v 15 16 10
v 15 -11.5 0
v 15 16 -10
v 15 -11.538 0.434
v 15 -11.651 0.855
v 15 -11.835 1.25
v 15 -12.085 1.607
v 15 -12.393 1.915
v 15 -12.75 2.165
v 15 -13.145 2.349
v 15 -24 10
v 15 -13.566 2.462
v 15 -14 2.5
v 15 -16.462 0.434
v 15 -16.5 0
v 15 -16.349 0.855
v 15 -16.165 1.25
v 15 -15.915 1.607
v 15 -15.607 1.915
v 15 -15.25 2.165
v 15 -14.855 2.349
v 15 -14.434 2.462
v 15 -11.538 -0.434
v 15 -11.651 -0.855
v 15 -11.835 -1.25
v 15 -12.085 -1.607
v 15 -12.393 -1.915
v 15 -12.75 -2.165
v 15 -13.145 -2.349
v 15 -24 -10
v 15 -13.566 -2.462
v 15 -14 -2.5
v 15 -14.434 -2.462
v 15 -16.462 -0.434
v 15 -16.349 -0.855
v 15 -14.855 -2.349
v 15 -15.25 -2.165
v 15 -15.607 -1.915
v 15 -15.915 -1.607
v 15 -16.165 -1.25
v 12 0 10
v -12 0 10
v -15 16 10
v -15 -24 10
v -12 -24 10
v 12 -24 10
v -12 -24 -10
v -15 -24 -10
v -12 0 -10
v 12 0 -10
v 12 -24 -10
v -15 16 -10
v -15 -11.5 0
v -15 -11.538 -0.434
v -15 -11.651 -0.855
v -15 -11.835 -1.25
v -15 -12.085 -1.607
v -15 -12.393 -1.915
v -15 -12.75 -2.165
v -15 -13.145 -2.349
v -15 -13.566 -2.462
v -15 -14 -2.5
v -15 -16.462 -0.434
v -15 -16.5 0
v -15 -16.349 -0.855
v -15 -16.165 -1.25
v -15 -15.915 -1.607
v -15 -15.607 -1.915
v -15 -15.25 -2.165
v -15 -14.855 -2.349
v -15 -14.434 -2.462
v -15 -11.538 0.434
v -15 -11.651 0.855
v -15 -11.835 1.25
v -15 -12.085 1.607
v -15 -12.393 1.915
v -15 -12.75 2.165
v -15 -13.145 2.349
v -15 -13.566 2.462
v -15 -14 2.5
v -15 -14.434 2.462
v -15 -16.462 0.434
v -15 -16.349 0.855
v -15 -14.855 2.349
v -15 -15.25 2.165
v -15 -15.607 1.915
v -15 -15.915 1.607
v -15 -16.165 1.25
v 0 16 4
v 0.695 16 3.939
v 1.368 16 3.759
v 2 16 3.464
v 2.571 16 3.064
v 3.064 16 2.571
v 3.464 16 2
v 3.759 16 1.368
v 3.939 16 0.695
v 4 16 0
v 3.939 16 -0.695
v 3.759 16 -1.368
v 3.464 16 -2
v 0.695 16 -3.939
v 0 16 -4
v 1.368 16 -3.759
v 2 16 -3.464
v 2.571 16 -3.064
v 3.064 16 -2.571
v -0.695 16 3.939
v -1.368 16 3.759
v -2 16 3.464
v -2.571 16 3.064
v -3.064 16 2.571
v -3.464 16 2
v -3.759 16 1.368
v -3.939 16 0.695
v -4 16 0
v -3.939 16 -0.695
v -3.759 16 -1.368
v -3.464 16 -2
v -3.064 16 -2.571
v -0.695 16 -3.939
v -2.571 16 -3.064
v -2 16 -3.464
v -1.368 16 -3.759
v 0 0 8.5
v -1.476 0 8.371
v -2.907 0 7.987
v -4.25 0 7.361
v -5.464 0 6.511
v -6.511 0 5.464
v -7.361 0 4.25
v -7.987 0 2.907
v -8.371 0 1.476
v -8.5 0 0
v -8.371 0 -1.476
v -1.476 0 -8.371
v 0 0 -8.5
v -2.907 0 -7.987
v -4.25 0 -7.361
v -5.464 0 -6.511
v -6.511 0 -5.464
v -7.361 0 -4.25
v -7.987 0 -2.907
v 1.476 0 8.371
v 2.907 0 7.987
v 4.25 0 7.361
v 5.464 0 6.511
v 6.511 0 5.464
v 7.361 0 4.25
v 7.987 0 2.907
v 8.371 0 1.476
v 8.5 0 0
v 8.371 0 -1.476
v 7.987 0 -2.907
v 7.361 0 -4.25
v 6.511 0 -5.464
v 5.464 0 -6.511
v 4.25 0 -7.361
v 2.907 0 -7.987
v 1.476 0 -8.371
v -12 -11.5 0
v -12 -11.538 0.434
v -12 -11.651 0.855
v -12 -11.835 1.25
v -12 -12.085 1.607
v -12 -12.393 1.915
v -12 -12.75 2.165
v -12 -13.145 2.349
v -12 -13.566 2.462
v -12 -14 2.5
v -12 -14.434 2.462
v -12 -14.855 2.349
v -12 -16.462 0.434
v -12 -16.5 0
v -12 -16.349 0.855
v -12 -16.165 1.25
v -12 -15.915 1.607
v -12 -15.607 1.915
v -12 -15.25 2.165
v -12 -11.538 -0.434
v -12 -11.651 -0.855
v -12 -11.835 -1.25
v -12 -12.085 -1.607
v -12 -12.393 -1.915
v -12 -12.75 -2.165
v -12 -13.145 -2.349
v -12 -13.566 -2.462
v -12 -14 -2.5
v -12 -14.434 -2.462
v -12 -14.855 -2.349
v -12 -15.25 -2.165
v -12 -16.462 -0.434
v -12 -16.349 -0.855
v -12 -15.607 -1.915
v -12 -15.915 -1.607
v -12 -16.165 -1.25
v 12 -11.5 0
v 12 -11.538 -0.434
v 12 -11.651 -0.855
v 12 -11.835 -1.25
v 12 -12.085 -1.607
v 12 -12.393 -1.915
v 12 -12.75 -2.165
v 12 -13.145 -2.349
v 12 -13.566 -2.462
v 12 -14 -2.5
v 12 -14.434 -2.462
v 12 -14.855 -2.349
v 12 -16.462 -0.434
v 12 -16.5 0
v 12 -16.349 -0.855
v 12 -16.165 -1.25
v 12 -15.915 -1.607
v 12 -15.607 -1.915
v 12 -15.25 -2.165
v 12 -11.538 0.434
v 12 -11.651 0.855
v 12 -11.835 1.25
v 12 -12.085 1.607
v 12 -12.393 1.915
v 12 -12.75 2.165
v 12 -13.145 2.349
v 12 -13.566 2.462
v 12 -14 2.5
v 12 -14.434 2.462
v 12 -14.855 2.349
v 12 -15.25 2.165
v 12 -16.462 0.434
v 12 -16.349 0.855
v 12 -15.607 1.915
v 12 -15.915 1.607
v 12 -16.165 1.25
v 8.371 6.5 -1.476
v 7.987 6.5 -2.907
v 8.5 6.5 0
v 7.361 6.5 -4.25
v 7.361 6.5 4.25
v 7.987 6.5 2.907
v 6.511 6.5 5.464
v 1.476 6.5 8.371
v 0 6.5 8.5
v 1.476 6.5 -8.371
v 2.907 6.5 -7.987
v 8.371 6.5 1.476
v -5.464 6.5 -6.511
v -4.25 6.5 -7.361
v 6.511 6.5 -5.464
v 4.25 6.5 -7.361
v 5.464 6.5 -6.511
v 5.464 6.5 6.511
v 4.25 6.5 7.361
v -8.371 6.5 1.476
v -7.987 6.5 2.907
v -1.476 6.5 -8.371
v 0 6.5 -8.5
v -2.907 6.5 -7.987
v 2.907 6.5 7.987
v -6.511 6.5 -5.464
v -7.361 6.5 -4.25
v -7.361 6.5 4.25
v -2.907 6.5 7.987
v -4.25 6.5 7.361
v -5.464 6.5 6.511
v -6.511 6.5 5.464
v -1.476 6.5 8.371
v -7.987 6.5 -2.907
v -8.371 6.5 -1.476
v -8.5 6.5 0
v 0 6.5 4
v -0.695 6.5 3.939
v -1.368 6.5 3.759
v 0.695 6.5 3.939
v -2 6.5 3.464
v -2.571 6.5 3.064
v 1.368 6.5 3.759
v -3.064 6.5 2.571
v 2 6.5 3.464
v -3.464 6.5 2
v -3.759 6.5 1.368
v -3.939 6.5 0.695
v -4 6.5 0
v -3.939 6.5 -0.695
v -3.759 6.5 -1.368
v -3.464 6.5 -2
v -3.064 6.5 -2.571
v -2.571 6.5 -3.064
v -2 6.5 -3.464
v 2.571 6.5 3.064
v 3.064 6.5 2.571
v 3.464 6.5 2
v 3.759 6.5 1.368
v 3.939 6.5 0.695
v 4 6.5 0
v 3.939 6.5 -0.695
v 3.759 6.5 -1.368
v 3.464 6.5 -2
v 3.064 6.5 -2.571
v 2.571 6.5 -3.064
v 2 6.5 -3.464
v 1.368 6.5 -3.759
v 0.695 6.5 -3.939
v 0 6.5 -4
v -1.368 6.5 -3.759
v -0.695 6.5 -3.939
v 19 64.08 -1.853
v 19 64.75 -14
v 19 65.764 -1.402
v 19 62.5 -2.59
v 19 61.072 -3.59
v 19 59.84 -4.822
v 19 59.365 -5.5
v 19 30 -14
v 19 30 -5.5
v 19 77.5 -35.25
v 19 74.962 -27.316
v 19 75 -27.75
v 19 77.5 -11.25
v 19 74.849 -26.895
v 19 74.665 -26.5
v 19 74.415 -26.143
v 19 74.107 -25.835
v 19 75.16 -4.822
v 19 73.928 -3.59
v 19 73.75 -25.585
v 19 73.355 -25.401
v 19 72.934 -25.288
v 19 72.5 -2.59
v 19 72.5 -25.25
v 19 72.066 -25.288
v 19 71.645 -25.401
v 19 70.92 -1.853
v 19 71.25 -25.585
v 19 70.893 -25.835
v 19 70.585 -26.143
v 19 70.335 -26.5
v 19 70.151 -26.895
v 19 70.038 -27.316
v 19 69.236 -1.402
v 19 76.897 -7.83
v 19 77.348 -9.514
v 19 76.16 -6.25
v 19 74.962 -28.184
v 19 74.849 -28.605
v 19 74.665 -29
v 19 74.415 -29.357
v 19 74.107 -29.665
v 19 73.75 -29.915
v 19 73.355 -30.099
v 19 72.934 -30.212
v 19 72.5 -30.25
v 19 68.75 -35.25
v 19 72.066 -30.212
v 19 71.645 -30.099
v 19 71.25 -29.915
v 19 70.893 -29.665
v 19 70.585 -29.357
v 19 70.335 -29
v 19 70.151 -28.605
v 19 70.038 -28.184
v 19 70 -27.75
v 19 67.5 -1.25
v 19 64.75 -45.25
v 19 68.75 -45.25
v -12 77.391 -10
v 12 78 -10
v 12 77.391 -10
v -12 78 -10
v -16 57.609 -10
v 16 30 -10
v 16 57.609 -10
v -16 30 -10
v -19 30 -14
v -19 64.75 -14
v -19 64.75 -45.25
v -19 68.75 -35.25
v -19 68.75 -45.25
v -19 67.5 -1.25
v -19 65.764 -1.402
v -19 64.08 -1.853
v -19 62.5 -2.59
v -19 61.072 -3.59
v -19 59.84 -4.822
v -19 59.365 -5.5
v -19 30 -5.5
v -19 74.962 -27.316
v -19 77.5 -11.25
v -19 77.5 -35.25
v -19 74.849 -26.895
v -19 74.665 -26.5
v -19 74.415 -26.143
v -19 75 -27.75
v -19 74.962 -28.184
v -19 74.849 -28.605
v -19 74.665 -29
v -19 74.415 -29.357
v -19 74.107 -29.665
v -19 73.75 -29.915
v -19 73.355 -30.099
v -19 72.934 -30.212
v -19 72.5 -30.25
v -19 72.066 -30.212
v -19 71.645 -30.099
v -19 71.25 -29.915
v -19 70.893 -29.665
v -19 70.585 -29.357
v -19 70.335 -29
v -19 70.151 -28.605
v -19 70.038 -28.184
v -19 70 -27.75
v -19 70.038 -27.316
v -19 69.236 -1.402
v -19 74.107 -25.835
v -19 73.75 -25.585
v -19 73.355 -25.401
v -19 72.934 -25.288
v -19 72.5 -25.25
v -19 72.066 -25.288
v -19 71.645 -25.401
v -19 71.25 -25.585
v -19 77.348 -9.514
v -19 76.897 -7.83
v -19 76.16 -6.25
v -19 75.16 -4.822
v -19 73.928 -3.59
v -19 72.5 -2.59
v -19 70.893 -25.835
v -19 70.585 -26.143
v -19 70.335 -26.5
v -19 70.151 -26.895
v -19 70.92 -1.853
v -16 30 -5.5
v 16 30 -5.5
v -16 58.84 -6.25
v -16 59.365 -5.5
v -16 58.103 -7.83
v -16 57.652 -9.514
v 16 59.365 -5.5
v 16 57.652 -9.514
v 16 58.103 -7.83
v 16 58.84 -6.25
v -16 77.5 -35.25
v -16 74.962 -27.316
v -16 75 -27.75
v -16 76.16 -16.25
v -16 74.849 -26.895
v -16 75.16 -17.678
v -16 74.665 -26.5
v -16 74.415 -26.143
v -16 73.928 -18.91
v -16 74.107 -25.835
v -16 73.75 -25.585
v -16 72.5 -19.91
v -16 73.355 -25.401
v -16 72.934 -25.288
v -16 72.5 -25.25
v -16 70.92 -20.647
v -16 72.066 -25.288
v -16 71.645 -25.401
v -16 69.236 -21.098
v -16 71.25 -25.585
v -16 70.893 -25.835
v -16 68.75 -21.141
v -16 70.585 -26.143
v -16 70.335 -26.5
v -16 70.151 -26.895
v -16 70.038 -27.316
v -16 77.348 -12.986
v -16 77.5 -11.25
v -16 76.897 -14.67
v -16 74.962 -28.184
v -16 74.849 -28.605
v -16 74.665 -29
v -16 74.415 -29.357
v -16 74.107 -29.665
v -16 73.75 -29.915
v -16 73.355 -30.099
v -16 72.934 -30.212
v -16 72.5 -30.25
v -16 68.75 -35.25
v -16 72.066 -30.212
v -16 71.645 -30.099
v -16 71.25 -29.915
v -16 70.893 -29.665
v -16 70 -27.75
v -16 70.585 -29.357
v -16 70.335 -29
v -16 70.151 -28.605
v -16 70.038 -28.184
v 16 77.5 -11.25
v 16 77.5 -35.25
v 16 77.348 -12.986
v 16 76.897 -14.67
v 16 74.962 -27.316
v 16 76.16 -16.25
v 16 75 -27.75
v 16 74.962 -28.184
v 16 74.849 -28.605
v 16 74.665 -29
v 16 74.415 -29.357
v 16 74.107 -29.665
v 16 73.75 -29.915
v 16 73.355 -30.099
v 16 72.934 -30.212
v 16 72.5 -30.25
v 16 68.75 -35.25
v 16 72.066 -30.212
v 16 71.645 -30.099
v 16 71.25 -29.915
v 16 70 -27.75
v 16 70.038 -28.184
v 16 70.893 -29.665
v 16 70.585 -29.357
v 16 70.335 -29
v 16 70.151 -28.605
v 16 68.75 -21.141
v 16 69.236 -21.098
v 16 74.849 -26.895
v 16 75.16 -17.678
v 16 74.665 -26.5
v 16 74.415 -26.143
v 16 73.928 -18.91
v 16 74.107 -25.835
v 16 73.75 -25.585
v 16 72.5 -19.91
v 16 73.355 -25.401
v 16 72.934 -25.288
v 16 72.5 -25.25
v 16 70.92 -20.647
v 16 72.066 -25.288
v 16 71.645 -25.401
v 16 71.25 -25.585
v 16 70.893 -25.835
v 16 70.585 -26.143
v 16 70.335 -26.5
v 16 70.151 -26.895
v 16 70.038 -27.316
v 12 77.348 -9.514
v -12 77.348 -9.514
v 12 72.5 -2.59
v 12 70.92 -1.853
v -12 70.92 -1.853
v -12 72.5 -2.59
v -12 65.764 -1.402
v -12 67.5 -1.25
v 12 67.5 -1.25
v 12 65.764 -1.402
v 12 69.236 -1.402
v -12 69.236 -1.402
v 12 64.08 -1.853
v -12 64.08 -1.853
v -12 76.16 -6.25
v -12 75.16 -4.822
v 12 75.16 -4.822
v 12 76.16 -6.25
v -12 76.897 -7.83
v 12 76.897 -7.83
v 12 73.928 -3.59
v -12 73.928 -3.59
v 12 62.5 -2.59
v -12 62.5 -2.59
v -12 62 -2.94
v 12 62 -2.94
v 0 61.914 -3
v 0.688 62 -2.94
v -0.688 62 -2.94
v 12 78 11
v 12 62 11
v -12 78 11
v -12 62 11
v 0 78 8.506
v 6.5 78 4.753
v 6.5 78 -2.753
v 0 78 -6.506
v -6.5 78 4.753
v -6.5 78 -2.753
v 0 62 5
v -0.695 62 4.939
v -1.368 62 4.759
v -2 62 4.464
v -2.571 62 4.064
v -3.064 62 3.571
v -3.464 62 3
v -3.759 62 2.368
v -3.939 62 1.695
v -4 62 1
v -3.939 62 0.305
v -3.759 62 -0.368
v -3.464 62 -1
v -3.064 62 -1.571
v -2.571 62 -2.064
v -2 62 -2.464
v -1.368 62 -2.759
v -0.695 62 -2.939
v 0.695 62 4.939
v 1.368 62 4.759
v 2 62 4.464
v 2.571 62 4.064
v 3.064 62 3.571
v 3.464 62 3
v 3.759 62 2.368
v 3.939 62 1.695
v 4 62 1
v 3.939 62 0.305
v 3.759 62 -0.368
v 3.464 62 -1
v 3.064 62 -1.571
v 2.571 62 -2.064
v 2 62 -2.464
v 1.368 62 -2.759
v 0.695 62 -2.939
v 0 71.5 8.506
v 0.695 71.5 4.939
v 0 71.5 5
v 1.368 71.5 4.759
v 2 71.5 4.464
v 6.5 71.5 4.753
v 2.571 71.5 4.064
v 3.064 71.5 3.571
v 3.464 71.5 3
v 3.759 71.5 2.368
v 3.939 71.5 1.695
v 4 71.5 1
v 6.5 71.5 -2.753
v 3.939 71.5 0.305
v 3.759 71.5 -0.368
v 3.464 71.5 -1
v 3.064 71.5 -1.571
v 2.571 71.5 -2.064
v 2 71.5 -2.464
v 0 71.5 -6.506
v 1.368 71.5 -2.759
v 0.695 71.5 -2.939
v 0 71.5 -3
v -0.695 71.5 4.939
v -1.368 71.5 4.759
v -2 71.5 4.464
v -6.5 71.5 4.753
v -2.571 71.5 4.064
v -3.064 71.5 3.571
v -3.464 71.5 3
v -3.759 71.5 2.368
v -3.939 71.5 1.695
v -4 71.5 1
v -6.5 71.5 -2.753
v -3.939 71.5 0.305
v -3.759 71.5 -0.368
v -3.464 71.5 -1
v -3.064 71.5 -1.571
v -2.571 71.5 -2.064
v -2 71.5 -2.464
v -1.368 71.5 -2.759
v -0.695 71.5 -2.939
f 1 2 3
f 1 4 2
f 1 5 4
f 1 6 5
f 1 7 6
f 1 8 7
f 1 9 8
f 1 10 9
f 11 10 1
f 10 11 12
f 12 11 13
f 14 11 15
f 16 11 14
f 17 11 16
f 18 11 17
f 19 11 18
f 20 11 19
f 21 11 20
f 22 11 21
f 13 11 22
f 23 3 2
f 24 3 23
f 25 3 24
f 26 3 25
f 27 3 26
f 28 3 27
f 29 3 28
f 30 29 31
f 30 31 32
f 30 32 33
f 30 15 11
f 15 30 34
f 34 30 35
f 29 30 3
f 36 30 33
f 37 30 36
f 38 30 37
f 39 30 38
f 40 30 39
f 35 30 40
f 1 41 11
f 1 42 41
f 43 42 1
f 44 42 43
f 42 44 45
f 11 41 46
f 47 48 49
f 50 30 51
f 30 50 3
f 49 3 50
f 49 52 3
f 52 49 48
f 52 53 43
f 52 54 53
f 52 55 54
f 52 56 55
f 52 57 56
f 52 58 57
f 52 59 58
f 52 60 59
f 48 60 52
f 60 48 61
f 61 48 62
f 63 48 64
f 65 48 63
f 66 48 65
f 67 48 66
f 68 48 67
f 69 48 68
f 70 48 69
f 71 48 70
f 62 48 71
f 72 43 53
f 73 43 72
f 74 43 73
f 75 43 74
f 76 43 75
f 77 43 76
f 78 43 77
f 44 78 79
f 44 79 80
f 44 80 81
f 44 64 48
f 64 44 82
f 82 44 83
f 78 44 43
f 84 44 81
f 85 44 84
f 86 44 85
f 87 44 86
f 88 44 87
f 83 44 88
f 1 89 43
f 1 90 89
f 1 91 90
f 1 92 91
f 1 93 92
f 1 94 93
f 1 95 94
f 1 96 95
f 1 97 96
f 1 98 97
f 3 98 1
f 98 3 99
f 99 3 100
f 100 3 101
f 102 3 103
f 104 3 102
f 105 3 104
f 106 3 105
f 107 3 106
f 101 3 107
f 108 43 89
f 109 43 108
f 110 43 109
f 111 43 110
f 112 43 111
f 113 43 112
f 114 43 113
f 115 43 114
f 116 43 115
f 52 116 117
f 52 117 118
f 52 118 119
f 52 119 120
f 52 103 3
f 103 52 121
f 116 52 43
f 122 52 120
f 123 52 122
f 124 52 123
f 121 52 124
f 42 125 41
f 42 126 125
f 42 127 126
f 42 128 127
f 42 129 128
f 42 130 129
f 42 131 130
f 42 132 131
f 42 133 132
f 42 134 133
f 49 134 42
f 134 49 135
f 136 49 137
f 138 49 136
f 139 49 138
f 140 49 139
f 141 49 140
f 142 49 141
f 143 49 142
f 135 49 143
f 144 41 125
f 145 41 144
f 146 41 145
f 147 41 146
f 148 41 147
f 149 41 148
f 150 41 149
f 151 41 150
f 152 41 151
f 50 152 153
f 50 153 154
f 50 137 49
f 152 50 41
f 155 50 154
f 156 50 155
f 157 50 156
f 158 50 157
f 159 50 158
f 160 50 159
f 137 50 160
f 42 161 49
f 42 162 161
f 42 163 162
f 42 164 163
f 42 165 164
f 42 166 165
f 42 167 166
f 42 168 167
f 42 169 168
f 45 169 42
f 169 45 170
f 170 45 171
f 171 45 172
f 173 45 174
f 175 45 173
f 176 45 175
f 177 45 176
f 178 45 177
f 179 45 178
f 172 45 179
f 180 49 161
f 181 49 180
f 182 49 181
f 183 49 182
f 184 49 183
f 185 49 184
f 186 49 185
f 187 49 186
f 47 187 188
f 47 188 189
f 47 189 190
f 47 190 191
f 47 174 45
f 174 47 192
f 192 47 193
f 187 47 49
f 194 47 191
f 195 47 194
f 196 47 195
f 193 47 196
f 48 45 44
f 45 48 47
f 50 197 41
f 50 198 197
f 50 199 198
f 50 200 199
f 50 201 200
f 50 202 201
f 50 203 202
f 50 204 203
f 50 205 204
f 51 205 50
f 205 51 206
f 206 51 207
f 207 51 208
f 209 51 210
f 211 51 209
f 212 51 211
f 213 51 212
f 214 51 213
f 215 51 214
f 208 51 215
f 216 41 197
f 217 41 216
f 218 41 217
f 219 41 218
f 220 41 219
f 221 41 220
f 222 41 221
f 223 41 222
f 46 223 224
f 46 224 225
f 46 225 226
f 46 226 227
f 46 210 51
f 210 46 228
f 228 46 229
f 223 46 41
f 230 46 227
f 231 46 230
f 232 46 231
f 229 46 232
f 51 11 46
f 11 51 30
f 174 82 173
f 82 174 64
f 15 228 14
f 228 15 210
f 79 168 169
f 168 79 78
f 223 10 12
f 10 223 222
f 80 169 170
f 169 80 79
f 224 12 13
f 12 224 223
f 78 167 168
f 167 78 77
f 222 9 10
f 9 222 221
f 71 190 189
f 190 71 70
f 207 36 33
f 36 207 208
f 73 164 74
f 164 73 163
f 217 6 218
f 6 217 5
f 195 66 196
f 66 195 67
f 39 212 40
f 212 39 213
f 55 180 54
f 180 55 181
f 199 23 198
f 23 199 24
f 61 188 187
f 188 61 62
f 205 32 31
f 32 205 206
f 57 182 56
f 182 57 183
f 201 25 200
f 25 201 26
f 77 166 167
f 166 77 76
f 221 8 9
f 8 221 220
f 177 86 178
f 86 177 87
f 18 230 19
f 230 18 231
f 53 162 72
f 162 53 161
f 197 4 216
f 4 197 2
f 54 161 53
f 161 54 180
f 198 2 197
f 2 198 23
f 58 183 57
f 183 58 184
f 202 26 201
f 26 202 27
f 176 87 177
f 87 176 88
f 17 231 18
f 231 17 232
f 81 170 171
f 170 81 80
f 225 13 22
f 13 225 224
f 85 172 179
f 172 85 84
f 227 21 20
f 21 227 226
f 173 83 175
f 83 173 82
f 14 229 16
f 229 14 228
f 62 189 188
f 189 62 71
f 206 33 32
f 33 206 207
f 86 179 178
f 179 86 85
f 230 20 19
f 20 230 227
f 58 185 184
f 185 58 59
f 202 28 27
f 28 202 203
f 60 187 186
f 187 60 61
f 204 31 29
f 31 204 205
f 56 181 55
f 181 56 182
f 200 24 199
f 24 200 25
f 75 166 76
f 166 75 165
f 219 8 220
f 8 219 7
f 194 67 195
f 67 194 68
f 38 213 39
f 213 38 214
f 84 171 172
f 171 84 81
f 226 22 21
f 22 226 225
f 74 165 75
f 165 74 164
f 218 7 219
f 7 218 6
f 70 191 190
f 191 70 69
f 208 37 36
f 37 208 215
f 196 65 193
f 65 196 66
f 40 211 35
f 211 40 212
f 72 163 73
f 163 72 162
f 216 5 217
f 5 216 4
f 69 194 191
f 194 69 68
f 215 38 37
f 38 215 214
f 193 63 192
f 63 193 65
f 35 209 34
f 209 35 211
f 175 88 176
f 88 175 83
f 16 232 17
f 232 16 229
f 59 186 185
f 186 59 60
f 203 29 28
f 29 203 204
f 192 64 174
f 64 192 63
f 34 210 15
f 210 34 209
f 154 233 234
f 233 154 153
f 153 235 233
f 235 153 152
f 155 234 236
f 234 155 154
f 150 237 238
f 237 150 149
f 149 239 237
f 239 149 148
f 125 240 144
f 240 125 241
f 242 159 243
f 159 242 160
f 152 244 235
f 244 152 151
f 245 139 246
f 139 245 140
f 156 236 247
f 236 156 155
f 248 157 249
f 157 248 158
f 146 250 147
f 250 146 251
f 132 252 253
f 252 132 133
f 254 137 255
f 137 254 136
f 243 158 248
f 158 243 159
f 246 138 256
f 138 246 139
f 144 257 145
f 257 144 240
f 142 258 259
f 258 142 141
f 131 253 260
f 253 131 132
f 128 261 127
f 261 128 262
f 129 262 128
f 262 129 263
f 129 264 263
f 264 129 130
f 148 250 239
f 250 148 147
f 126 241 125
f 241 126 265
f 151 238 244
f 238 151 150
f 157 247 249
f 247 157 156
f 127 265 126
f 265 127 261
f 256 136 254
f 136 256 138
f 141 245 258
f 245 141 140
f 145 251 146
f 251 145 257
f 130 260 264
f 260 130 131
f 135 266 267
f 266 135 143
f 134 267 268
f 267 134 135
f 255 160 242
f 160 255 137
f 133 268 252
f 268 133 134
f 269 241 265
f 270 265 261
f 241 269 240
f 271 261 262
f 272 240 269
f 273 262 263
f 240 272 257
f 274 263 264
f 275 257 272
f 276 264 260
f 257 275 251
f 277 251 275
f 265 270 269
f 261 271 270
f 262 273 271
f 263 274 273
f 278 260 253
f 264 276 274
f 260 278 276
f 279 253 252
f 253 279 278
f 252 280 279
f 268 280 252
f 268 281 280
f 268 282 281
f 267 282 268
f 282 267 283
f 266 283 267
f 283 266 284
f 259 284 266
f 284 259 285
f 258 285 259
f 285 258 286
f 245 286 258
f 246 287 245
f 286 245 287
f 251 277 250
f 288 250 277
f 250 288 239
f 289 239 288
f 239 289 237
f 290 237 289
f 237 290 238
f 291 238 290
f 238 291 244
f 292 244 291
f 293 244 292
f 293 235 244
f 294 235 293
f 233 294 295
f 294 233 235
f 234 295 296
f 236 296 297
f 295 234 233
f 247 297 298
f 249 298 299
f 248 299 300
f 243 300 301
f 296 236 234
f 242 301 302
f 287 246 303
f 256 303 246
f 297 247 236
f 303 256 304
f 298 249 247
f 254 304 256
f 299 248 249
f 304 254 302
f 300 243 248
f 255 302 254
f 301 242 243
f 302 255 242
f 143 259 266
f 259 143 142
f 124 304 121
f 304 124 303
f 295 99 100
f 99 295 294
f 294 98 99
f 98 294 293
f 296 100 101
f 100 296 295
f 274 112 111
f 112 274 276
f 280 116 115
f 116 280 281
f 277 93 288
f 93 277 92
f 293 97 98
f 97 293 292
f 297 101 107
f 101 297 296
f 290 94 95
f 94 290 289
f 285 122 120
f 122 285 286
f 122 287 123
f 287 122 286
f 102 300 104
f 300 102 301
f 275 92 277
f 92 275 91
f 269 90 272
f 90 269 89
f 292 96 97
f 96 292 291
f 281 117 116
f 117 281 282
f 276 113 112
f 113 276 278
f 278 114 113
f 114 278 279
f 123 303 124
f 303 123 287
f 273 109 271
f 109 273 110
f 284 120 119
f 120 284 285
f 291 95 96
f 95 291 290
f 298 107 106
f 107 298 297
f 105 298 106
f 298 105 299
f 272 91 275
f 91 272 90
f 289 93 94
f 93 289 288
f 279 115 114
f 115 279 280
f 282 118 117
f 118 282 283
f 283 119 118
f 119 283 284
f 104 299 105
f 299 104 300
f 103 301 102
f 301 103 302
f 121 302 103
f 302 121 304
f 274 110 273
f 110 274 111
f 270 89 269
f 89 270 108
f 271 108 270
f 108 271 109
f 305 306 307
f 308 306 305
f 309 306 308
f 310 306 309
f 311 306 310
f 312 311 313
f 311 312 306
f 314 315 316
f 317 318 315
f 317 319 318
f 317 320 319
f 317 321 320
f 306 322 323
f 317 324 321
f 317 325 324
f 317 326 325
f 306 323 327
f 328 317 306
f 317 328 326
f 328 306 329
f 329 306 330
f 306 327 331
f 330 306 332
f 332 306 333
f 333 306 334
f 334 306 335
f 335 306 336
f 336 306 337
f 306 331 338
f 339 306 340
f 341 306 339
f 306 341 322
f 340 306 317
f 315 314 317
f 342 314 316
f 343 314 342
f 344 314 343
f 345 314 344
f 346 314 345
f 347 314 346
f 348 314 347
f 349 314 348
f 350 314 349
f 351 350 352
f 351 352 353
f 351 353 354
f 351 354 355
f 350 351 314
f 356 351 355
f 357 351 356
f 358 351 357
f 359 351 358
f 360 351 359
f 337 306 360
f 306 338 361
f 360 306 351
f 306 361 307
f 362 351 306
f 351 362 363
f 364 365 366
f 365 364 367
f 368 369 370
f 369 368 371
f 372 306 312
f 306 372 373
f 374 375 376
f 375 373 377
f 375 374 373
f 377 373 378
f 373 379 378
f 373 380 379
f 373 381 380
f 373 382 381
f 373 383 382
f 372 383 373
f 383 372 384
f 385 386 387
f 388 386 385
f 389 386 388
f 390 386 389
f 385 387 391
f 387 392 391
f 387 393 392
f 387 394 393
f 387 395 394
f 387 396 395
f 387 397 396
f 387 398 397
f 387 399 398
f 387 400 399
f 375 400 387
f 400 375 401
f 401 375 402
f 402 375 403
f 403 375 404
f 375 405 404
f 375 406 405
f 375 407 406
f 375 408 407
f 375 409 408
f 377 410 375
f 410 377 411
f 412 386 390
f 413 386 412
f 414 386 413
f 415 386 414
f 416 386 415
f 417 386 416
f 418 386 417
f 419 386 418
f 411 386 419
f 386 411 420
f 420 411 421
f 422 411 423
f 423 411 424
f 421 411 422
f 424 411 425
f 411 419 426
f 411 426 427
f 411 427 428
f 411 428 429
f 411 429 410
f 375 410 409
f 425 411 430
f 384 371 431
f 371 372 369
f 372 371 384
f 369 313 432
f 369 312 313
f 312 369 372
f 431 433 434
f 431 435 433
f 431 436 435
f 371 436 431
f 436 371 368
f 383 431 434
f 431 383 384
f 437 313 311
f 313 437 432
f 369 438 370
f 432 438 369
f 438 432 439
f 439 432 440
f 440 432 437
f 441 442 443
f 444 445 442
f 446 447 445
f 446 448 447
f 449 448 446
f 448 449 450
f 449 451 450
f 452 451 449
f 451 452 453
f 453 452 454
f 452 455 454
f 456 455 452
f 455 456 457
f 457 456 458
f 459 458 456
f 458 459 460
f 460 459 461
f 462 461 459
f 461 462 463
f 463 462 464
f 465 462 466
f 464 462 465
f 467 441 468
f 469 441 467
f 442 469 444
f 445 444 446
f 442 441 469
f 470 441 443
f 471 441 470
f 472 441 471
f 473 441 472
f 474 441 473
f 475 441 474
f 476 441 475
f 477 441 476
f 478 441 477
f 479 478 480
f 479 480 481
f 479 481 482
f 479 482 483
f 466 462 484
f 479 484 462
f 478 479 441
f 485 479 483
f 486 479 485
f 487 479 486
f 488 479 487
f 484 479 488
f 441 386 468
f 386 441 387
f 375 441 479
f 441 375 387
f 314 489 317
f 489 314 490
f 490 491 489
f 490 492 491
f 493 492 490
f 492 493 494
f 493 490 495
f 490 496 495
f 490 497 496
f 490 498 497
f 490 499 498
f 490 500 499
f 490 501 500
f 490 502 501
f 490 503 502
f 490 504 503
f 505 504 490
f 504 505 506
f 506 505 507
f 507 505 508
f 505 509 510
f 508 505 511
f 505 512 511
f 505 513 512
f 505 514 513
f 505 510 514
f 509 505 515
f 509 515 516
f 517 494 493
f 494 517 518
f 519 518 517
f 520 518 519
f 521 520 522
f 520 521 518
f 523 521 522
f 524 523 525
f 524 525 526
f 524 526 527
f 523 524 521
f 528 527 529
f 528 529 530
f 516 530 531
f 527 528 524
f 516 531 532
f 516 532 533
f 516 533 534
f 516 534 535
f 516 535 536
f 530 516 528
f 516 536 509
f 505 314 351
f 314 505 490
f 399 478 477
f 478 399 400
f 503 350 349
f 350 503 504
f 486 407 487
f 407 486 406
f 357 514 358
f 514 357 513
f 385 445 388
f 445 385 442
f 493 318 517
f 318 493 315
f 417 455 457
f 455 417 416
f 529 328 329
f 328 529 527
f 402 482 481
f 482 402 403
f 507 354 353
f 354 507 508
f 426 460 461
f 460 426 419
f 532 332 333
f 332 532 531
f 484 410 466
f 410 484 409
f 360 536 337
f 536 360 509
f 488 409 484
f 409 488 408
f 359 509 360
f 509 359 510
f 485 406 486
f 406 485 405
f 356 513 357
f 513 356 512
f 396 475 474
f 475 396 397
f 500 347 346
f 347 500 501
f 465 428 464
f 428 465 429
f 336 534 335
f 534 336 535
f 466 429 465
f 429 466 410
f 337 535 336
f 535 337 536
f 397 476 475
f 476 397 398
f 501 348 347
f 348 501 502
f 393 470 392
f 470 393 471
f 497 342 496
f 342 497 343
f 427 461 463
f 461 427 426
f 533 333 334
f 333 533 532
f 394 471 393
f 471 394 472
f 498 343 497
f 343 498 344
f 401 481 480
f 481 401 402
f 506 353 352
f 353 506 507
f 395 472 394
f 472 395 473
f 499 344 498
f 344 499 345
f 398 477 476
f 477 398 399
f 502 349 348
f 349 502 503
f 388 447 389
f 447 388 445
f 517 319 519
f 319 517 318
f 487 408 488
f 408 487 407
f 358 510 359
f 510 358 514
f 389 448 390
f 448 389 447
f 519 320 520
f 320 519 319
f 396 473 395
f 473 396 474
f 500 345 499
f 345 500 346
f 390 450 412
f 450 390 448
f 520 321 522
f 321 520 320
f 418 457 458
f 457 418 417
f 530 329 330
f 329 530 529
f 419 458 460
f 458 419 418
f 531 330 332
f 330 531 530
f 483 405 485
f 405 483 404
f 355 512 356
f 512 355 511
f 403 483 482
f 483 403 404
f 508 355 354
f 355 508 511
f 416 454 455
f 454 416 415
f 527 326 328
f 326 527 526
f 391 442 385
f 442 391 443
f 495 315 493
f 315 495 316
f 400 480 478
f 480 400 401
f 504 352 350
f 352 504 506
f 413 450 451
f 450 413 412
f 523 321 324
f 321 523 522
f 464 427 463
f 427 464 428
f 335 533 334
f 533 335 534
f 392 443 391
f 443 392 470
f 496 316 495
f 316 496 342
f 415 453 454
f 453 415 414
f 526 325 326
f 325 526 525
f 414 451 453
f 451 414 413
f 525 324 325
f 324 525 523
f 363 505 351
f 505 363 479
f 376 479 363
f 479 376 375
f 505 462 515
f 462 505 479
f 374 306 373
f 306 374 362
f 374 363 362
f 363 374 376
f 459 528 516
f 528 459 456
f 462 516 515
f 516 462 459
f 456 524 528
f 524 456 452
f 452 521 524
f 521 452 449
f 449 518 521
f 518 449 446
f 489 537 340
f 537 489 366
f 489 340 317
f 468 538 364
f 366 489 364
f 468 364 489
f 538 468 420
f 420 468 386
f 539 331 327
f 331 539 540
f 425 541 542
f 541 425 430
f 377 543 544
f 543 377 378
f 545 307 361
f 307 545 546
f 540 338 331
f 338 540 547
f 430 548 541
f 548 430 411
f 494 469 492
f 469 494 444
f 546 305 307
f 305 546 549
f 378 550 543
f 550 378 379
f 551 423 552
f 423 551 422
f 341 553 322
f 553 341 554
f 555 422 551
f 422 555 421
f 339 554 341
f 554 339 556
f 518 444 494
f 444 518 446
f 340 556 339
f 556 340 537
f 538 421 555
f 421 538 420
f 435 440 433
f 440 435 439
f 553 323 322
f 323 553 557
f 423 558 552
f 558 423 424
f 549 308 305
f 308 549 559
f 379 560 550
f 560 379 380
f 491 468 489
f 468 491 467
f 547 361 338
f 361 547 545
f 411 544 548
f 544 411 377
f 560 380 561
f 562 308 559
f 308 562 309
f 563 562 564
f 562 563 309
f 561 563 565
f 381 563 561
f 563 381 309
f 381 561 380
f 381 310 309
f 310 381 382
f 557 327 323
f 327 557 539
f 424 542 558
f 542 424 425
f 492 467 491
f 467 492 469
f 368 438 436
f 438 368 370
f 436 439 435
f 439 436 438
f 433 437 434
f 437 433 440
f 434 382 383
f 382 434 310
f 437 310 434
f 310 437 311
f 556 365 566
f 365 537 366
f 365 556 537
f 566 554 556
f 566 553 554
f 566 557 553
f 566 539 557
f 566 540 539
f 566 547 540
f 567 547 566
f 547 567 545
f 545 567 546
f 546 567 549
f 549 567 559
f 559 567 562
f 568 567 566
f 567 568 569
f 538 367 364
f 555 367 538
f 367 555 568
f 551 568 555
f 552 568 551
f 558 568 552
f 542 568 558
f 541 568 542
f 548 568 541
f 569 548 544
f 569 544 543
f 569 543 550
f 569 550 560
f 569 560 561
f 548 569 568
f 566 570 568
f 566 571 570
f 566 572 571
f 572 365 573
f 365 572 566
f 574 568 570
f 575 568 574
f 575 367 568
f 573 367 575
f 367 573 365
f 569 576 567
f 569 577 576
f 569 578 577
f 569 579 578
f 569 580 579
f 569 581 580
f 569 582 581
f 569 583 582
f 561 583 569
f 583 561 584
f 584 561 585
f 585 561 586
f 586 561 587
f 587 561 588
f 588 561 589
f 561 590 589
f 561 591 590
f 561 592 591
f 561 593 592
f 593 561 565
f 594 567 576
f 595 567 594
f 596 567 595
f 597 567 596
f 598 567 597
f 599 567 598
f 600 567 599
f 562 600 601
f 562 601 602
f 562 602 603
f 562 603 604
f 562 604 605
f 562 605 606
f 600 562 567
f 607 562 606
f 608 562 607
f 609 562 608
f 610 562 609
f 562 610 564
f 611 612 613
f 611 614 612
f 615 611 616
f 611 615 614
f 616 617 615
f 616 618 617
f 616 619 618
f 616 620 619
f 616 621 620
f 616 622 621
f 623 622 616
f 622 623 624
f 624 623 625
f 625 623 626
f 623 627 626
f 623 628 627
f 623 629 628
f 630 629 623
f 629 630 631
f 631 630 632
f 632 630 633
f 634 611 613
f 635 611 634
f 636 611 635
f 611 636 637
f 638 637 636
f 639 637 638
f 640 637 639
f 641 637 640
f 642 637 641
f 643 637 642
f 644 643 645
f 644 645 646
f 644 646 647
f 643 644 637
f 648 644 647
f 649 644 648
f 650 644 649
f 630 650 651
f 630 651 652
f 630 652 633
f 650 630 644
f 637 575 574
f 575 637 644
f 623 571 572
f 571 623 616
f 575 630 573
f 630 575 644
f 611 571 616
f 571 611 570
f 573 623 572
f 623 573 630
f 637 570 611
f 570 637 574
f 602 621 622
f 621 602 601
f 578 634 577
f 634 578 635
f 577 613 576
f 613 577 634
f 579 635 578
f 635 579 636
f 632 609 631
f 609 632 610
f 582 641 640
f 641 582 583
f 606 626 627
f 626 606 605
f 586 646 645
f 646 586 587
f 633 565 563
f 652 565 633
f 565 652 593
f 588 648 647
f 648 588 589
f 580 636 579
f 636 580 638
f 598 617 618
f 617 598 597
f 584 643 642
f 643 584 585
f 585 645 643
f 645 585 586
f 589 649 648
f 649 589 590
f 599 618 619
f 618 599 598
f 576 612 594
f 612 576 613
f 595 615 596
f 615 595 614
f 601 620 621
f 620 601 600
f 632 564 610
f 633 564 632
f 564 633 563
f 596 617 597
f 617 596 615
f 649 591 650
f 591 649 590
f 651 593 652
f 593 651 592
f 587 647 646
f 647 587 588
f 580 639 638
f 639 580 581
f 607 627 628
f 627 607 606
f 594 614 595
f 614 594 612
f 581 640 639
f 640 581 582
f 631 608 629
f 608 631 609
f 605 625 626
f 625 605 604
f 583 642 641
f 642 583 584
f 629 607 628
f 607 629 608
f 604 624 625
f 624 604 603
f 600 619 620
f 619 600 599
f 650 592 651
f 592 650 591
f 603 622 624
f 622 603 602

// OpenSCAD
//----------------------------------------------------------------------------

epsilon = 0.1;
$fn = 36;
// nut sizes:
//   M5   8mm  4mm thick
//   M6  10mm  5mm thick
//   M8  13mm  6.5mm thick

washer_thickness = 1;
washer_diameter = 16;

fastener_bolt = 8;
fastener_nut_size = 13;
fastener_nut_height = 6.5;

belt_bolt = 5;

belt_wing_thickness = 3; // also: railing

mobile_mount_width = 30; // including 2 * belt_wing_thickness
mobile_mount_height = 20;
mobile_mount_support_thickness = 16;
mobile_mount_wing_length = 24;

square_mount_support_radius = 10;

square_mount_side_thickness = 4;
square_mount_bed_length = 40;
square_mount_wing_length = 24;
square_mount_wing_height = square_mount_support_radius;
square_mount_railing_height = mobile_mount_height / 2 - belt_wing_thickness / 2;

square_mount_belt_side_length = square_mount_support_radius + square_mount_wing_length;

tolerance = 1;

//----------------------------------------------------------------------------

//translate([0, 45, 0])
//rotate([0, 0, 90])
//color("lightgrey") bolt(100, size = fastener_bolt, nut = [fastener_nut_size * 3, fastener_nut_height]);
//
//color("blue") {
//  translate([0, 6.5 - washer_thickness, 0])
//  washer(d = washer_diameter);
//
//  translate([0, -(8 - 6.5 + washer_thickness), 0])
//  rotate([-90, 0, 0])
//  nut_head(13, 8); // self-locking nut
//}

translate([0, 0, 0])
mobile_mount();

translate([0, 30, 0])
square_mount();

//----------------------------------------------------------------------------

module square_mount() {
  width = mobile_mount_width + 2 * belt_wing_thickness + 2 * tolerance;

  fastener_bolt_head_height = mobile_mount_height;
  fastener_bolt_head_width = mobile_mount_width - 2 * belt_wing_thickness;
  fastener_bolt_head_depth = mobile_mount_support_thickness;
  belt_side_length = square_mount_wing_length + square_mount_support_radius;

  translate([-width / 2, 0, -fastener_bolt_head_height / 2]) {
    // bed for mobile mount
    translate([0, 0, -square_mount_side_thickness]) {
      cube([width, square_mount_bed_length, square_mount_side_thickness]);

      cube([belt_wing_thickness, square_mount_bed_length, square_mount_railing_height]);

      translate([width - belt_wing_thickness, 0, 0])
      cube([belt_wing_thickness, square_mount_bed_length, square_mount_railing_height]);
    }

    // side for belt
    translate([0, square_mount_bed_length - square_mount_side_thickness, 0])
    translate([0, -(square_mount_support_radius / 8), -(square_mount_support_radius / 8)])
    rotate([-90, 0, 0]) {
      cube([width, belt_side_length, square_mount_side_thickness]);

      translate([0, 0, square_mount_side_thickness - square_mount_support_radius / 8])
      difference() {
        union() {
          cube([belt_wing_thickness, square_mount_wing_length, square_mount_wing_height]);
          translate([width - belt_wing_thickness, 0, 0])
          cube([belt_wing_thickness, square_mount_wing_length, square_mount_wing_height]);
        }

        translate([0, square_mount_wing_length - 1.5 * belt_bolt, square_mount_wing_height / 2])
        rotate([0, 90, 0])
        translate([0, 0, -epsilon])
        cylinder(d = belt_bolt, h = width + 2 * epsilon);
      }
    }

    difference() {
      union() {
        // support
        translate([0, square_mount_bed_length - square_mount_support_radius / 8, 0])
        rotate([0, 90, 0])
        difference() {
          translate([square_mount_support_radius / 8, -square_mount_support_radius / 8, 0])
          cylinder(r = square_mount_support_radius, h = width);
          translate([0, -square_mount_support_radius * 2, -epsilon])
          cube([square_mount_support_radius * 2, square_mount_support_radius * 2, width + 2 * epsilon]);
        }

        // head for fastener bolt
        translate([(width - fastener_bolt_head_width) / 2,
                   (square_mount_bed_length - fastener_bolt_head_depth / 2),
                   0])
        cube([fastener_bolt_head_width, fastener_bolt_head_depth, fastener_bolt_head_height + tolerance]);
      }

      translate([0, 0, tolerance])
      translate([0, (square_mount_bed_length + fastener_bolt_head_depth / 2), 0])
      translate([width / 2, -fastener_bolt_head_depth / 2, fastener_bolt_head_height / 2])
      rotate([0, 0, 90])
      bolt(fastener_bolt_head_depth + 2 * epsilon, size = fastener_bolt, nut = [fastener_nut_size, fastener_nut_height + epsilon]);
    }
  }
}

module mobile_mount() {
  translate([-mobile_mount_width / 2, 0, -mobile_mount_height / 2])
  difference() {
    union() {
      cube([mobile_mount_width, mobile_mount_support_thickness, mobile_mount_height]);

      translate([0, -mobile_mount_wing_length, 0])
      cube([belt_wing_thickness, mobile_mount_wing_length, mobile_mount_height]);

      translate([mobile_mount_width - belt_wing_thickness, -mobile_mount_wing_length, 0])
      cube([belt_wing_thickness, mobile_mount_wing_length, mobile_mount_height]);
    }

    translate([mobile_mount_width / 2, -epsilon, mobile_mount_height / 2])
    washer(d = washer_diameter + 1, hole = 0, thickness = fastener_nut_height + epsilon);

    translate([mobile_mount_width / 2, -epsilon, mobile_mount_height / 2])
    rotate([-90, 0, 0])
    cylinder(d = fastener_bolt, h = mobile_mount_support_thickness + 2 * epsilon);

    translate([0, -(mobile_mount_wing_length - mobile_mount_height / 2), 0])
    translate([mobile_mount_width / 2, 0, mobile_mount_height / 2])
    bolt(mobile_mount_width + 20, size = belt_bolt);
  }
}

//----------------------------------------------------------------------------

module bolt(length, size = 6, nut = [10, 5]) {
  translate([length / 2, 0, 0])
  rotate([0, -90, 0]) {
    cylinder(d = size, h = length);
    nut_head(width = nut[0], height = nut[1]);
  }
}

module washer(d, hole = 6, thickness = washer_thickness) {
  rotate([-90, 0, 0])
  difference() {
    cylinder(d = d, h = thickness);

    if (hole > 0) {
      translate([0, 0, -epsilon])
      cylinder(d = hole + 0.5, h = thickness + 2 * epsilon);
    }
  }
}

module nut_head(width, height) {
  side = width / sqrt(3);

  for (i = [0, 60, 120]) {
    rotate([0, 0, i])
    translate([-side / 2, -width / 2, 0])
    cube([side, width, height]);
  }
}

//----------------------------------------------------------------------------
// vim:ft=openscad
